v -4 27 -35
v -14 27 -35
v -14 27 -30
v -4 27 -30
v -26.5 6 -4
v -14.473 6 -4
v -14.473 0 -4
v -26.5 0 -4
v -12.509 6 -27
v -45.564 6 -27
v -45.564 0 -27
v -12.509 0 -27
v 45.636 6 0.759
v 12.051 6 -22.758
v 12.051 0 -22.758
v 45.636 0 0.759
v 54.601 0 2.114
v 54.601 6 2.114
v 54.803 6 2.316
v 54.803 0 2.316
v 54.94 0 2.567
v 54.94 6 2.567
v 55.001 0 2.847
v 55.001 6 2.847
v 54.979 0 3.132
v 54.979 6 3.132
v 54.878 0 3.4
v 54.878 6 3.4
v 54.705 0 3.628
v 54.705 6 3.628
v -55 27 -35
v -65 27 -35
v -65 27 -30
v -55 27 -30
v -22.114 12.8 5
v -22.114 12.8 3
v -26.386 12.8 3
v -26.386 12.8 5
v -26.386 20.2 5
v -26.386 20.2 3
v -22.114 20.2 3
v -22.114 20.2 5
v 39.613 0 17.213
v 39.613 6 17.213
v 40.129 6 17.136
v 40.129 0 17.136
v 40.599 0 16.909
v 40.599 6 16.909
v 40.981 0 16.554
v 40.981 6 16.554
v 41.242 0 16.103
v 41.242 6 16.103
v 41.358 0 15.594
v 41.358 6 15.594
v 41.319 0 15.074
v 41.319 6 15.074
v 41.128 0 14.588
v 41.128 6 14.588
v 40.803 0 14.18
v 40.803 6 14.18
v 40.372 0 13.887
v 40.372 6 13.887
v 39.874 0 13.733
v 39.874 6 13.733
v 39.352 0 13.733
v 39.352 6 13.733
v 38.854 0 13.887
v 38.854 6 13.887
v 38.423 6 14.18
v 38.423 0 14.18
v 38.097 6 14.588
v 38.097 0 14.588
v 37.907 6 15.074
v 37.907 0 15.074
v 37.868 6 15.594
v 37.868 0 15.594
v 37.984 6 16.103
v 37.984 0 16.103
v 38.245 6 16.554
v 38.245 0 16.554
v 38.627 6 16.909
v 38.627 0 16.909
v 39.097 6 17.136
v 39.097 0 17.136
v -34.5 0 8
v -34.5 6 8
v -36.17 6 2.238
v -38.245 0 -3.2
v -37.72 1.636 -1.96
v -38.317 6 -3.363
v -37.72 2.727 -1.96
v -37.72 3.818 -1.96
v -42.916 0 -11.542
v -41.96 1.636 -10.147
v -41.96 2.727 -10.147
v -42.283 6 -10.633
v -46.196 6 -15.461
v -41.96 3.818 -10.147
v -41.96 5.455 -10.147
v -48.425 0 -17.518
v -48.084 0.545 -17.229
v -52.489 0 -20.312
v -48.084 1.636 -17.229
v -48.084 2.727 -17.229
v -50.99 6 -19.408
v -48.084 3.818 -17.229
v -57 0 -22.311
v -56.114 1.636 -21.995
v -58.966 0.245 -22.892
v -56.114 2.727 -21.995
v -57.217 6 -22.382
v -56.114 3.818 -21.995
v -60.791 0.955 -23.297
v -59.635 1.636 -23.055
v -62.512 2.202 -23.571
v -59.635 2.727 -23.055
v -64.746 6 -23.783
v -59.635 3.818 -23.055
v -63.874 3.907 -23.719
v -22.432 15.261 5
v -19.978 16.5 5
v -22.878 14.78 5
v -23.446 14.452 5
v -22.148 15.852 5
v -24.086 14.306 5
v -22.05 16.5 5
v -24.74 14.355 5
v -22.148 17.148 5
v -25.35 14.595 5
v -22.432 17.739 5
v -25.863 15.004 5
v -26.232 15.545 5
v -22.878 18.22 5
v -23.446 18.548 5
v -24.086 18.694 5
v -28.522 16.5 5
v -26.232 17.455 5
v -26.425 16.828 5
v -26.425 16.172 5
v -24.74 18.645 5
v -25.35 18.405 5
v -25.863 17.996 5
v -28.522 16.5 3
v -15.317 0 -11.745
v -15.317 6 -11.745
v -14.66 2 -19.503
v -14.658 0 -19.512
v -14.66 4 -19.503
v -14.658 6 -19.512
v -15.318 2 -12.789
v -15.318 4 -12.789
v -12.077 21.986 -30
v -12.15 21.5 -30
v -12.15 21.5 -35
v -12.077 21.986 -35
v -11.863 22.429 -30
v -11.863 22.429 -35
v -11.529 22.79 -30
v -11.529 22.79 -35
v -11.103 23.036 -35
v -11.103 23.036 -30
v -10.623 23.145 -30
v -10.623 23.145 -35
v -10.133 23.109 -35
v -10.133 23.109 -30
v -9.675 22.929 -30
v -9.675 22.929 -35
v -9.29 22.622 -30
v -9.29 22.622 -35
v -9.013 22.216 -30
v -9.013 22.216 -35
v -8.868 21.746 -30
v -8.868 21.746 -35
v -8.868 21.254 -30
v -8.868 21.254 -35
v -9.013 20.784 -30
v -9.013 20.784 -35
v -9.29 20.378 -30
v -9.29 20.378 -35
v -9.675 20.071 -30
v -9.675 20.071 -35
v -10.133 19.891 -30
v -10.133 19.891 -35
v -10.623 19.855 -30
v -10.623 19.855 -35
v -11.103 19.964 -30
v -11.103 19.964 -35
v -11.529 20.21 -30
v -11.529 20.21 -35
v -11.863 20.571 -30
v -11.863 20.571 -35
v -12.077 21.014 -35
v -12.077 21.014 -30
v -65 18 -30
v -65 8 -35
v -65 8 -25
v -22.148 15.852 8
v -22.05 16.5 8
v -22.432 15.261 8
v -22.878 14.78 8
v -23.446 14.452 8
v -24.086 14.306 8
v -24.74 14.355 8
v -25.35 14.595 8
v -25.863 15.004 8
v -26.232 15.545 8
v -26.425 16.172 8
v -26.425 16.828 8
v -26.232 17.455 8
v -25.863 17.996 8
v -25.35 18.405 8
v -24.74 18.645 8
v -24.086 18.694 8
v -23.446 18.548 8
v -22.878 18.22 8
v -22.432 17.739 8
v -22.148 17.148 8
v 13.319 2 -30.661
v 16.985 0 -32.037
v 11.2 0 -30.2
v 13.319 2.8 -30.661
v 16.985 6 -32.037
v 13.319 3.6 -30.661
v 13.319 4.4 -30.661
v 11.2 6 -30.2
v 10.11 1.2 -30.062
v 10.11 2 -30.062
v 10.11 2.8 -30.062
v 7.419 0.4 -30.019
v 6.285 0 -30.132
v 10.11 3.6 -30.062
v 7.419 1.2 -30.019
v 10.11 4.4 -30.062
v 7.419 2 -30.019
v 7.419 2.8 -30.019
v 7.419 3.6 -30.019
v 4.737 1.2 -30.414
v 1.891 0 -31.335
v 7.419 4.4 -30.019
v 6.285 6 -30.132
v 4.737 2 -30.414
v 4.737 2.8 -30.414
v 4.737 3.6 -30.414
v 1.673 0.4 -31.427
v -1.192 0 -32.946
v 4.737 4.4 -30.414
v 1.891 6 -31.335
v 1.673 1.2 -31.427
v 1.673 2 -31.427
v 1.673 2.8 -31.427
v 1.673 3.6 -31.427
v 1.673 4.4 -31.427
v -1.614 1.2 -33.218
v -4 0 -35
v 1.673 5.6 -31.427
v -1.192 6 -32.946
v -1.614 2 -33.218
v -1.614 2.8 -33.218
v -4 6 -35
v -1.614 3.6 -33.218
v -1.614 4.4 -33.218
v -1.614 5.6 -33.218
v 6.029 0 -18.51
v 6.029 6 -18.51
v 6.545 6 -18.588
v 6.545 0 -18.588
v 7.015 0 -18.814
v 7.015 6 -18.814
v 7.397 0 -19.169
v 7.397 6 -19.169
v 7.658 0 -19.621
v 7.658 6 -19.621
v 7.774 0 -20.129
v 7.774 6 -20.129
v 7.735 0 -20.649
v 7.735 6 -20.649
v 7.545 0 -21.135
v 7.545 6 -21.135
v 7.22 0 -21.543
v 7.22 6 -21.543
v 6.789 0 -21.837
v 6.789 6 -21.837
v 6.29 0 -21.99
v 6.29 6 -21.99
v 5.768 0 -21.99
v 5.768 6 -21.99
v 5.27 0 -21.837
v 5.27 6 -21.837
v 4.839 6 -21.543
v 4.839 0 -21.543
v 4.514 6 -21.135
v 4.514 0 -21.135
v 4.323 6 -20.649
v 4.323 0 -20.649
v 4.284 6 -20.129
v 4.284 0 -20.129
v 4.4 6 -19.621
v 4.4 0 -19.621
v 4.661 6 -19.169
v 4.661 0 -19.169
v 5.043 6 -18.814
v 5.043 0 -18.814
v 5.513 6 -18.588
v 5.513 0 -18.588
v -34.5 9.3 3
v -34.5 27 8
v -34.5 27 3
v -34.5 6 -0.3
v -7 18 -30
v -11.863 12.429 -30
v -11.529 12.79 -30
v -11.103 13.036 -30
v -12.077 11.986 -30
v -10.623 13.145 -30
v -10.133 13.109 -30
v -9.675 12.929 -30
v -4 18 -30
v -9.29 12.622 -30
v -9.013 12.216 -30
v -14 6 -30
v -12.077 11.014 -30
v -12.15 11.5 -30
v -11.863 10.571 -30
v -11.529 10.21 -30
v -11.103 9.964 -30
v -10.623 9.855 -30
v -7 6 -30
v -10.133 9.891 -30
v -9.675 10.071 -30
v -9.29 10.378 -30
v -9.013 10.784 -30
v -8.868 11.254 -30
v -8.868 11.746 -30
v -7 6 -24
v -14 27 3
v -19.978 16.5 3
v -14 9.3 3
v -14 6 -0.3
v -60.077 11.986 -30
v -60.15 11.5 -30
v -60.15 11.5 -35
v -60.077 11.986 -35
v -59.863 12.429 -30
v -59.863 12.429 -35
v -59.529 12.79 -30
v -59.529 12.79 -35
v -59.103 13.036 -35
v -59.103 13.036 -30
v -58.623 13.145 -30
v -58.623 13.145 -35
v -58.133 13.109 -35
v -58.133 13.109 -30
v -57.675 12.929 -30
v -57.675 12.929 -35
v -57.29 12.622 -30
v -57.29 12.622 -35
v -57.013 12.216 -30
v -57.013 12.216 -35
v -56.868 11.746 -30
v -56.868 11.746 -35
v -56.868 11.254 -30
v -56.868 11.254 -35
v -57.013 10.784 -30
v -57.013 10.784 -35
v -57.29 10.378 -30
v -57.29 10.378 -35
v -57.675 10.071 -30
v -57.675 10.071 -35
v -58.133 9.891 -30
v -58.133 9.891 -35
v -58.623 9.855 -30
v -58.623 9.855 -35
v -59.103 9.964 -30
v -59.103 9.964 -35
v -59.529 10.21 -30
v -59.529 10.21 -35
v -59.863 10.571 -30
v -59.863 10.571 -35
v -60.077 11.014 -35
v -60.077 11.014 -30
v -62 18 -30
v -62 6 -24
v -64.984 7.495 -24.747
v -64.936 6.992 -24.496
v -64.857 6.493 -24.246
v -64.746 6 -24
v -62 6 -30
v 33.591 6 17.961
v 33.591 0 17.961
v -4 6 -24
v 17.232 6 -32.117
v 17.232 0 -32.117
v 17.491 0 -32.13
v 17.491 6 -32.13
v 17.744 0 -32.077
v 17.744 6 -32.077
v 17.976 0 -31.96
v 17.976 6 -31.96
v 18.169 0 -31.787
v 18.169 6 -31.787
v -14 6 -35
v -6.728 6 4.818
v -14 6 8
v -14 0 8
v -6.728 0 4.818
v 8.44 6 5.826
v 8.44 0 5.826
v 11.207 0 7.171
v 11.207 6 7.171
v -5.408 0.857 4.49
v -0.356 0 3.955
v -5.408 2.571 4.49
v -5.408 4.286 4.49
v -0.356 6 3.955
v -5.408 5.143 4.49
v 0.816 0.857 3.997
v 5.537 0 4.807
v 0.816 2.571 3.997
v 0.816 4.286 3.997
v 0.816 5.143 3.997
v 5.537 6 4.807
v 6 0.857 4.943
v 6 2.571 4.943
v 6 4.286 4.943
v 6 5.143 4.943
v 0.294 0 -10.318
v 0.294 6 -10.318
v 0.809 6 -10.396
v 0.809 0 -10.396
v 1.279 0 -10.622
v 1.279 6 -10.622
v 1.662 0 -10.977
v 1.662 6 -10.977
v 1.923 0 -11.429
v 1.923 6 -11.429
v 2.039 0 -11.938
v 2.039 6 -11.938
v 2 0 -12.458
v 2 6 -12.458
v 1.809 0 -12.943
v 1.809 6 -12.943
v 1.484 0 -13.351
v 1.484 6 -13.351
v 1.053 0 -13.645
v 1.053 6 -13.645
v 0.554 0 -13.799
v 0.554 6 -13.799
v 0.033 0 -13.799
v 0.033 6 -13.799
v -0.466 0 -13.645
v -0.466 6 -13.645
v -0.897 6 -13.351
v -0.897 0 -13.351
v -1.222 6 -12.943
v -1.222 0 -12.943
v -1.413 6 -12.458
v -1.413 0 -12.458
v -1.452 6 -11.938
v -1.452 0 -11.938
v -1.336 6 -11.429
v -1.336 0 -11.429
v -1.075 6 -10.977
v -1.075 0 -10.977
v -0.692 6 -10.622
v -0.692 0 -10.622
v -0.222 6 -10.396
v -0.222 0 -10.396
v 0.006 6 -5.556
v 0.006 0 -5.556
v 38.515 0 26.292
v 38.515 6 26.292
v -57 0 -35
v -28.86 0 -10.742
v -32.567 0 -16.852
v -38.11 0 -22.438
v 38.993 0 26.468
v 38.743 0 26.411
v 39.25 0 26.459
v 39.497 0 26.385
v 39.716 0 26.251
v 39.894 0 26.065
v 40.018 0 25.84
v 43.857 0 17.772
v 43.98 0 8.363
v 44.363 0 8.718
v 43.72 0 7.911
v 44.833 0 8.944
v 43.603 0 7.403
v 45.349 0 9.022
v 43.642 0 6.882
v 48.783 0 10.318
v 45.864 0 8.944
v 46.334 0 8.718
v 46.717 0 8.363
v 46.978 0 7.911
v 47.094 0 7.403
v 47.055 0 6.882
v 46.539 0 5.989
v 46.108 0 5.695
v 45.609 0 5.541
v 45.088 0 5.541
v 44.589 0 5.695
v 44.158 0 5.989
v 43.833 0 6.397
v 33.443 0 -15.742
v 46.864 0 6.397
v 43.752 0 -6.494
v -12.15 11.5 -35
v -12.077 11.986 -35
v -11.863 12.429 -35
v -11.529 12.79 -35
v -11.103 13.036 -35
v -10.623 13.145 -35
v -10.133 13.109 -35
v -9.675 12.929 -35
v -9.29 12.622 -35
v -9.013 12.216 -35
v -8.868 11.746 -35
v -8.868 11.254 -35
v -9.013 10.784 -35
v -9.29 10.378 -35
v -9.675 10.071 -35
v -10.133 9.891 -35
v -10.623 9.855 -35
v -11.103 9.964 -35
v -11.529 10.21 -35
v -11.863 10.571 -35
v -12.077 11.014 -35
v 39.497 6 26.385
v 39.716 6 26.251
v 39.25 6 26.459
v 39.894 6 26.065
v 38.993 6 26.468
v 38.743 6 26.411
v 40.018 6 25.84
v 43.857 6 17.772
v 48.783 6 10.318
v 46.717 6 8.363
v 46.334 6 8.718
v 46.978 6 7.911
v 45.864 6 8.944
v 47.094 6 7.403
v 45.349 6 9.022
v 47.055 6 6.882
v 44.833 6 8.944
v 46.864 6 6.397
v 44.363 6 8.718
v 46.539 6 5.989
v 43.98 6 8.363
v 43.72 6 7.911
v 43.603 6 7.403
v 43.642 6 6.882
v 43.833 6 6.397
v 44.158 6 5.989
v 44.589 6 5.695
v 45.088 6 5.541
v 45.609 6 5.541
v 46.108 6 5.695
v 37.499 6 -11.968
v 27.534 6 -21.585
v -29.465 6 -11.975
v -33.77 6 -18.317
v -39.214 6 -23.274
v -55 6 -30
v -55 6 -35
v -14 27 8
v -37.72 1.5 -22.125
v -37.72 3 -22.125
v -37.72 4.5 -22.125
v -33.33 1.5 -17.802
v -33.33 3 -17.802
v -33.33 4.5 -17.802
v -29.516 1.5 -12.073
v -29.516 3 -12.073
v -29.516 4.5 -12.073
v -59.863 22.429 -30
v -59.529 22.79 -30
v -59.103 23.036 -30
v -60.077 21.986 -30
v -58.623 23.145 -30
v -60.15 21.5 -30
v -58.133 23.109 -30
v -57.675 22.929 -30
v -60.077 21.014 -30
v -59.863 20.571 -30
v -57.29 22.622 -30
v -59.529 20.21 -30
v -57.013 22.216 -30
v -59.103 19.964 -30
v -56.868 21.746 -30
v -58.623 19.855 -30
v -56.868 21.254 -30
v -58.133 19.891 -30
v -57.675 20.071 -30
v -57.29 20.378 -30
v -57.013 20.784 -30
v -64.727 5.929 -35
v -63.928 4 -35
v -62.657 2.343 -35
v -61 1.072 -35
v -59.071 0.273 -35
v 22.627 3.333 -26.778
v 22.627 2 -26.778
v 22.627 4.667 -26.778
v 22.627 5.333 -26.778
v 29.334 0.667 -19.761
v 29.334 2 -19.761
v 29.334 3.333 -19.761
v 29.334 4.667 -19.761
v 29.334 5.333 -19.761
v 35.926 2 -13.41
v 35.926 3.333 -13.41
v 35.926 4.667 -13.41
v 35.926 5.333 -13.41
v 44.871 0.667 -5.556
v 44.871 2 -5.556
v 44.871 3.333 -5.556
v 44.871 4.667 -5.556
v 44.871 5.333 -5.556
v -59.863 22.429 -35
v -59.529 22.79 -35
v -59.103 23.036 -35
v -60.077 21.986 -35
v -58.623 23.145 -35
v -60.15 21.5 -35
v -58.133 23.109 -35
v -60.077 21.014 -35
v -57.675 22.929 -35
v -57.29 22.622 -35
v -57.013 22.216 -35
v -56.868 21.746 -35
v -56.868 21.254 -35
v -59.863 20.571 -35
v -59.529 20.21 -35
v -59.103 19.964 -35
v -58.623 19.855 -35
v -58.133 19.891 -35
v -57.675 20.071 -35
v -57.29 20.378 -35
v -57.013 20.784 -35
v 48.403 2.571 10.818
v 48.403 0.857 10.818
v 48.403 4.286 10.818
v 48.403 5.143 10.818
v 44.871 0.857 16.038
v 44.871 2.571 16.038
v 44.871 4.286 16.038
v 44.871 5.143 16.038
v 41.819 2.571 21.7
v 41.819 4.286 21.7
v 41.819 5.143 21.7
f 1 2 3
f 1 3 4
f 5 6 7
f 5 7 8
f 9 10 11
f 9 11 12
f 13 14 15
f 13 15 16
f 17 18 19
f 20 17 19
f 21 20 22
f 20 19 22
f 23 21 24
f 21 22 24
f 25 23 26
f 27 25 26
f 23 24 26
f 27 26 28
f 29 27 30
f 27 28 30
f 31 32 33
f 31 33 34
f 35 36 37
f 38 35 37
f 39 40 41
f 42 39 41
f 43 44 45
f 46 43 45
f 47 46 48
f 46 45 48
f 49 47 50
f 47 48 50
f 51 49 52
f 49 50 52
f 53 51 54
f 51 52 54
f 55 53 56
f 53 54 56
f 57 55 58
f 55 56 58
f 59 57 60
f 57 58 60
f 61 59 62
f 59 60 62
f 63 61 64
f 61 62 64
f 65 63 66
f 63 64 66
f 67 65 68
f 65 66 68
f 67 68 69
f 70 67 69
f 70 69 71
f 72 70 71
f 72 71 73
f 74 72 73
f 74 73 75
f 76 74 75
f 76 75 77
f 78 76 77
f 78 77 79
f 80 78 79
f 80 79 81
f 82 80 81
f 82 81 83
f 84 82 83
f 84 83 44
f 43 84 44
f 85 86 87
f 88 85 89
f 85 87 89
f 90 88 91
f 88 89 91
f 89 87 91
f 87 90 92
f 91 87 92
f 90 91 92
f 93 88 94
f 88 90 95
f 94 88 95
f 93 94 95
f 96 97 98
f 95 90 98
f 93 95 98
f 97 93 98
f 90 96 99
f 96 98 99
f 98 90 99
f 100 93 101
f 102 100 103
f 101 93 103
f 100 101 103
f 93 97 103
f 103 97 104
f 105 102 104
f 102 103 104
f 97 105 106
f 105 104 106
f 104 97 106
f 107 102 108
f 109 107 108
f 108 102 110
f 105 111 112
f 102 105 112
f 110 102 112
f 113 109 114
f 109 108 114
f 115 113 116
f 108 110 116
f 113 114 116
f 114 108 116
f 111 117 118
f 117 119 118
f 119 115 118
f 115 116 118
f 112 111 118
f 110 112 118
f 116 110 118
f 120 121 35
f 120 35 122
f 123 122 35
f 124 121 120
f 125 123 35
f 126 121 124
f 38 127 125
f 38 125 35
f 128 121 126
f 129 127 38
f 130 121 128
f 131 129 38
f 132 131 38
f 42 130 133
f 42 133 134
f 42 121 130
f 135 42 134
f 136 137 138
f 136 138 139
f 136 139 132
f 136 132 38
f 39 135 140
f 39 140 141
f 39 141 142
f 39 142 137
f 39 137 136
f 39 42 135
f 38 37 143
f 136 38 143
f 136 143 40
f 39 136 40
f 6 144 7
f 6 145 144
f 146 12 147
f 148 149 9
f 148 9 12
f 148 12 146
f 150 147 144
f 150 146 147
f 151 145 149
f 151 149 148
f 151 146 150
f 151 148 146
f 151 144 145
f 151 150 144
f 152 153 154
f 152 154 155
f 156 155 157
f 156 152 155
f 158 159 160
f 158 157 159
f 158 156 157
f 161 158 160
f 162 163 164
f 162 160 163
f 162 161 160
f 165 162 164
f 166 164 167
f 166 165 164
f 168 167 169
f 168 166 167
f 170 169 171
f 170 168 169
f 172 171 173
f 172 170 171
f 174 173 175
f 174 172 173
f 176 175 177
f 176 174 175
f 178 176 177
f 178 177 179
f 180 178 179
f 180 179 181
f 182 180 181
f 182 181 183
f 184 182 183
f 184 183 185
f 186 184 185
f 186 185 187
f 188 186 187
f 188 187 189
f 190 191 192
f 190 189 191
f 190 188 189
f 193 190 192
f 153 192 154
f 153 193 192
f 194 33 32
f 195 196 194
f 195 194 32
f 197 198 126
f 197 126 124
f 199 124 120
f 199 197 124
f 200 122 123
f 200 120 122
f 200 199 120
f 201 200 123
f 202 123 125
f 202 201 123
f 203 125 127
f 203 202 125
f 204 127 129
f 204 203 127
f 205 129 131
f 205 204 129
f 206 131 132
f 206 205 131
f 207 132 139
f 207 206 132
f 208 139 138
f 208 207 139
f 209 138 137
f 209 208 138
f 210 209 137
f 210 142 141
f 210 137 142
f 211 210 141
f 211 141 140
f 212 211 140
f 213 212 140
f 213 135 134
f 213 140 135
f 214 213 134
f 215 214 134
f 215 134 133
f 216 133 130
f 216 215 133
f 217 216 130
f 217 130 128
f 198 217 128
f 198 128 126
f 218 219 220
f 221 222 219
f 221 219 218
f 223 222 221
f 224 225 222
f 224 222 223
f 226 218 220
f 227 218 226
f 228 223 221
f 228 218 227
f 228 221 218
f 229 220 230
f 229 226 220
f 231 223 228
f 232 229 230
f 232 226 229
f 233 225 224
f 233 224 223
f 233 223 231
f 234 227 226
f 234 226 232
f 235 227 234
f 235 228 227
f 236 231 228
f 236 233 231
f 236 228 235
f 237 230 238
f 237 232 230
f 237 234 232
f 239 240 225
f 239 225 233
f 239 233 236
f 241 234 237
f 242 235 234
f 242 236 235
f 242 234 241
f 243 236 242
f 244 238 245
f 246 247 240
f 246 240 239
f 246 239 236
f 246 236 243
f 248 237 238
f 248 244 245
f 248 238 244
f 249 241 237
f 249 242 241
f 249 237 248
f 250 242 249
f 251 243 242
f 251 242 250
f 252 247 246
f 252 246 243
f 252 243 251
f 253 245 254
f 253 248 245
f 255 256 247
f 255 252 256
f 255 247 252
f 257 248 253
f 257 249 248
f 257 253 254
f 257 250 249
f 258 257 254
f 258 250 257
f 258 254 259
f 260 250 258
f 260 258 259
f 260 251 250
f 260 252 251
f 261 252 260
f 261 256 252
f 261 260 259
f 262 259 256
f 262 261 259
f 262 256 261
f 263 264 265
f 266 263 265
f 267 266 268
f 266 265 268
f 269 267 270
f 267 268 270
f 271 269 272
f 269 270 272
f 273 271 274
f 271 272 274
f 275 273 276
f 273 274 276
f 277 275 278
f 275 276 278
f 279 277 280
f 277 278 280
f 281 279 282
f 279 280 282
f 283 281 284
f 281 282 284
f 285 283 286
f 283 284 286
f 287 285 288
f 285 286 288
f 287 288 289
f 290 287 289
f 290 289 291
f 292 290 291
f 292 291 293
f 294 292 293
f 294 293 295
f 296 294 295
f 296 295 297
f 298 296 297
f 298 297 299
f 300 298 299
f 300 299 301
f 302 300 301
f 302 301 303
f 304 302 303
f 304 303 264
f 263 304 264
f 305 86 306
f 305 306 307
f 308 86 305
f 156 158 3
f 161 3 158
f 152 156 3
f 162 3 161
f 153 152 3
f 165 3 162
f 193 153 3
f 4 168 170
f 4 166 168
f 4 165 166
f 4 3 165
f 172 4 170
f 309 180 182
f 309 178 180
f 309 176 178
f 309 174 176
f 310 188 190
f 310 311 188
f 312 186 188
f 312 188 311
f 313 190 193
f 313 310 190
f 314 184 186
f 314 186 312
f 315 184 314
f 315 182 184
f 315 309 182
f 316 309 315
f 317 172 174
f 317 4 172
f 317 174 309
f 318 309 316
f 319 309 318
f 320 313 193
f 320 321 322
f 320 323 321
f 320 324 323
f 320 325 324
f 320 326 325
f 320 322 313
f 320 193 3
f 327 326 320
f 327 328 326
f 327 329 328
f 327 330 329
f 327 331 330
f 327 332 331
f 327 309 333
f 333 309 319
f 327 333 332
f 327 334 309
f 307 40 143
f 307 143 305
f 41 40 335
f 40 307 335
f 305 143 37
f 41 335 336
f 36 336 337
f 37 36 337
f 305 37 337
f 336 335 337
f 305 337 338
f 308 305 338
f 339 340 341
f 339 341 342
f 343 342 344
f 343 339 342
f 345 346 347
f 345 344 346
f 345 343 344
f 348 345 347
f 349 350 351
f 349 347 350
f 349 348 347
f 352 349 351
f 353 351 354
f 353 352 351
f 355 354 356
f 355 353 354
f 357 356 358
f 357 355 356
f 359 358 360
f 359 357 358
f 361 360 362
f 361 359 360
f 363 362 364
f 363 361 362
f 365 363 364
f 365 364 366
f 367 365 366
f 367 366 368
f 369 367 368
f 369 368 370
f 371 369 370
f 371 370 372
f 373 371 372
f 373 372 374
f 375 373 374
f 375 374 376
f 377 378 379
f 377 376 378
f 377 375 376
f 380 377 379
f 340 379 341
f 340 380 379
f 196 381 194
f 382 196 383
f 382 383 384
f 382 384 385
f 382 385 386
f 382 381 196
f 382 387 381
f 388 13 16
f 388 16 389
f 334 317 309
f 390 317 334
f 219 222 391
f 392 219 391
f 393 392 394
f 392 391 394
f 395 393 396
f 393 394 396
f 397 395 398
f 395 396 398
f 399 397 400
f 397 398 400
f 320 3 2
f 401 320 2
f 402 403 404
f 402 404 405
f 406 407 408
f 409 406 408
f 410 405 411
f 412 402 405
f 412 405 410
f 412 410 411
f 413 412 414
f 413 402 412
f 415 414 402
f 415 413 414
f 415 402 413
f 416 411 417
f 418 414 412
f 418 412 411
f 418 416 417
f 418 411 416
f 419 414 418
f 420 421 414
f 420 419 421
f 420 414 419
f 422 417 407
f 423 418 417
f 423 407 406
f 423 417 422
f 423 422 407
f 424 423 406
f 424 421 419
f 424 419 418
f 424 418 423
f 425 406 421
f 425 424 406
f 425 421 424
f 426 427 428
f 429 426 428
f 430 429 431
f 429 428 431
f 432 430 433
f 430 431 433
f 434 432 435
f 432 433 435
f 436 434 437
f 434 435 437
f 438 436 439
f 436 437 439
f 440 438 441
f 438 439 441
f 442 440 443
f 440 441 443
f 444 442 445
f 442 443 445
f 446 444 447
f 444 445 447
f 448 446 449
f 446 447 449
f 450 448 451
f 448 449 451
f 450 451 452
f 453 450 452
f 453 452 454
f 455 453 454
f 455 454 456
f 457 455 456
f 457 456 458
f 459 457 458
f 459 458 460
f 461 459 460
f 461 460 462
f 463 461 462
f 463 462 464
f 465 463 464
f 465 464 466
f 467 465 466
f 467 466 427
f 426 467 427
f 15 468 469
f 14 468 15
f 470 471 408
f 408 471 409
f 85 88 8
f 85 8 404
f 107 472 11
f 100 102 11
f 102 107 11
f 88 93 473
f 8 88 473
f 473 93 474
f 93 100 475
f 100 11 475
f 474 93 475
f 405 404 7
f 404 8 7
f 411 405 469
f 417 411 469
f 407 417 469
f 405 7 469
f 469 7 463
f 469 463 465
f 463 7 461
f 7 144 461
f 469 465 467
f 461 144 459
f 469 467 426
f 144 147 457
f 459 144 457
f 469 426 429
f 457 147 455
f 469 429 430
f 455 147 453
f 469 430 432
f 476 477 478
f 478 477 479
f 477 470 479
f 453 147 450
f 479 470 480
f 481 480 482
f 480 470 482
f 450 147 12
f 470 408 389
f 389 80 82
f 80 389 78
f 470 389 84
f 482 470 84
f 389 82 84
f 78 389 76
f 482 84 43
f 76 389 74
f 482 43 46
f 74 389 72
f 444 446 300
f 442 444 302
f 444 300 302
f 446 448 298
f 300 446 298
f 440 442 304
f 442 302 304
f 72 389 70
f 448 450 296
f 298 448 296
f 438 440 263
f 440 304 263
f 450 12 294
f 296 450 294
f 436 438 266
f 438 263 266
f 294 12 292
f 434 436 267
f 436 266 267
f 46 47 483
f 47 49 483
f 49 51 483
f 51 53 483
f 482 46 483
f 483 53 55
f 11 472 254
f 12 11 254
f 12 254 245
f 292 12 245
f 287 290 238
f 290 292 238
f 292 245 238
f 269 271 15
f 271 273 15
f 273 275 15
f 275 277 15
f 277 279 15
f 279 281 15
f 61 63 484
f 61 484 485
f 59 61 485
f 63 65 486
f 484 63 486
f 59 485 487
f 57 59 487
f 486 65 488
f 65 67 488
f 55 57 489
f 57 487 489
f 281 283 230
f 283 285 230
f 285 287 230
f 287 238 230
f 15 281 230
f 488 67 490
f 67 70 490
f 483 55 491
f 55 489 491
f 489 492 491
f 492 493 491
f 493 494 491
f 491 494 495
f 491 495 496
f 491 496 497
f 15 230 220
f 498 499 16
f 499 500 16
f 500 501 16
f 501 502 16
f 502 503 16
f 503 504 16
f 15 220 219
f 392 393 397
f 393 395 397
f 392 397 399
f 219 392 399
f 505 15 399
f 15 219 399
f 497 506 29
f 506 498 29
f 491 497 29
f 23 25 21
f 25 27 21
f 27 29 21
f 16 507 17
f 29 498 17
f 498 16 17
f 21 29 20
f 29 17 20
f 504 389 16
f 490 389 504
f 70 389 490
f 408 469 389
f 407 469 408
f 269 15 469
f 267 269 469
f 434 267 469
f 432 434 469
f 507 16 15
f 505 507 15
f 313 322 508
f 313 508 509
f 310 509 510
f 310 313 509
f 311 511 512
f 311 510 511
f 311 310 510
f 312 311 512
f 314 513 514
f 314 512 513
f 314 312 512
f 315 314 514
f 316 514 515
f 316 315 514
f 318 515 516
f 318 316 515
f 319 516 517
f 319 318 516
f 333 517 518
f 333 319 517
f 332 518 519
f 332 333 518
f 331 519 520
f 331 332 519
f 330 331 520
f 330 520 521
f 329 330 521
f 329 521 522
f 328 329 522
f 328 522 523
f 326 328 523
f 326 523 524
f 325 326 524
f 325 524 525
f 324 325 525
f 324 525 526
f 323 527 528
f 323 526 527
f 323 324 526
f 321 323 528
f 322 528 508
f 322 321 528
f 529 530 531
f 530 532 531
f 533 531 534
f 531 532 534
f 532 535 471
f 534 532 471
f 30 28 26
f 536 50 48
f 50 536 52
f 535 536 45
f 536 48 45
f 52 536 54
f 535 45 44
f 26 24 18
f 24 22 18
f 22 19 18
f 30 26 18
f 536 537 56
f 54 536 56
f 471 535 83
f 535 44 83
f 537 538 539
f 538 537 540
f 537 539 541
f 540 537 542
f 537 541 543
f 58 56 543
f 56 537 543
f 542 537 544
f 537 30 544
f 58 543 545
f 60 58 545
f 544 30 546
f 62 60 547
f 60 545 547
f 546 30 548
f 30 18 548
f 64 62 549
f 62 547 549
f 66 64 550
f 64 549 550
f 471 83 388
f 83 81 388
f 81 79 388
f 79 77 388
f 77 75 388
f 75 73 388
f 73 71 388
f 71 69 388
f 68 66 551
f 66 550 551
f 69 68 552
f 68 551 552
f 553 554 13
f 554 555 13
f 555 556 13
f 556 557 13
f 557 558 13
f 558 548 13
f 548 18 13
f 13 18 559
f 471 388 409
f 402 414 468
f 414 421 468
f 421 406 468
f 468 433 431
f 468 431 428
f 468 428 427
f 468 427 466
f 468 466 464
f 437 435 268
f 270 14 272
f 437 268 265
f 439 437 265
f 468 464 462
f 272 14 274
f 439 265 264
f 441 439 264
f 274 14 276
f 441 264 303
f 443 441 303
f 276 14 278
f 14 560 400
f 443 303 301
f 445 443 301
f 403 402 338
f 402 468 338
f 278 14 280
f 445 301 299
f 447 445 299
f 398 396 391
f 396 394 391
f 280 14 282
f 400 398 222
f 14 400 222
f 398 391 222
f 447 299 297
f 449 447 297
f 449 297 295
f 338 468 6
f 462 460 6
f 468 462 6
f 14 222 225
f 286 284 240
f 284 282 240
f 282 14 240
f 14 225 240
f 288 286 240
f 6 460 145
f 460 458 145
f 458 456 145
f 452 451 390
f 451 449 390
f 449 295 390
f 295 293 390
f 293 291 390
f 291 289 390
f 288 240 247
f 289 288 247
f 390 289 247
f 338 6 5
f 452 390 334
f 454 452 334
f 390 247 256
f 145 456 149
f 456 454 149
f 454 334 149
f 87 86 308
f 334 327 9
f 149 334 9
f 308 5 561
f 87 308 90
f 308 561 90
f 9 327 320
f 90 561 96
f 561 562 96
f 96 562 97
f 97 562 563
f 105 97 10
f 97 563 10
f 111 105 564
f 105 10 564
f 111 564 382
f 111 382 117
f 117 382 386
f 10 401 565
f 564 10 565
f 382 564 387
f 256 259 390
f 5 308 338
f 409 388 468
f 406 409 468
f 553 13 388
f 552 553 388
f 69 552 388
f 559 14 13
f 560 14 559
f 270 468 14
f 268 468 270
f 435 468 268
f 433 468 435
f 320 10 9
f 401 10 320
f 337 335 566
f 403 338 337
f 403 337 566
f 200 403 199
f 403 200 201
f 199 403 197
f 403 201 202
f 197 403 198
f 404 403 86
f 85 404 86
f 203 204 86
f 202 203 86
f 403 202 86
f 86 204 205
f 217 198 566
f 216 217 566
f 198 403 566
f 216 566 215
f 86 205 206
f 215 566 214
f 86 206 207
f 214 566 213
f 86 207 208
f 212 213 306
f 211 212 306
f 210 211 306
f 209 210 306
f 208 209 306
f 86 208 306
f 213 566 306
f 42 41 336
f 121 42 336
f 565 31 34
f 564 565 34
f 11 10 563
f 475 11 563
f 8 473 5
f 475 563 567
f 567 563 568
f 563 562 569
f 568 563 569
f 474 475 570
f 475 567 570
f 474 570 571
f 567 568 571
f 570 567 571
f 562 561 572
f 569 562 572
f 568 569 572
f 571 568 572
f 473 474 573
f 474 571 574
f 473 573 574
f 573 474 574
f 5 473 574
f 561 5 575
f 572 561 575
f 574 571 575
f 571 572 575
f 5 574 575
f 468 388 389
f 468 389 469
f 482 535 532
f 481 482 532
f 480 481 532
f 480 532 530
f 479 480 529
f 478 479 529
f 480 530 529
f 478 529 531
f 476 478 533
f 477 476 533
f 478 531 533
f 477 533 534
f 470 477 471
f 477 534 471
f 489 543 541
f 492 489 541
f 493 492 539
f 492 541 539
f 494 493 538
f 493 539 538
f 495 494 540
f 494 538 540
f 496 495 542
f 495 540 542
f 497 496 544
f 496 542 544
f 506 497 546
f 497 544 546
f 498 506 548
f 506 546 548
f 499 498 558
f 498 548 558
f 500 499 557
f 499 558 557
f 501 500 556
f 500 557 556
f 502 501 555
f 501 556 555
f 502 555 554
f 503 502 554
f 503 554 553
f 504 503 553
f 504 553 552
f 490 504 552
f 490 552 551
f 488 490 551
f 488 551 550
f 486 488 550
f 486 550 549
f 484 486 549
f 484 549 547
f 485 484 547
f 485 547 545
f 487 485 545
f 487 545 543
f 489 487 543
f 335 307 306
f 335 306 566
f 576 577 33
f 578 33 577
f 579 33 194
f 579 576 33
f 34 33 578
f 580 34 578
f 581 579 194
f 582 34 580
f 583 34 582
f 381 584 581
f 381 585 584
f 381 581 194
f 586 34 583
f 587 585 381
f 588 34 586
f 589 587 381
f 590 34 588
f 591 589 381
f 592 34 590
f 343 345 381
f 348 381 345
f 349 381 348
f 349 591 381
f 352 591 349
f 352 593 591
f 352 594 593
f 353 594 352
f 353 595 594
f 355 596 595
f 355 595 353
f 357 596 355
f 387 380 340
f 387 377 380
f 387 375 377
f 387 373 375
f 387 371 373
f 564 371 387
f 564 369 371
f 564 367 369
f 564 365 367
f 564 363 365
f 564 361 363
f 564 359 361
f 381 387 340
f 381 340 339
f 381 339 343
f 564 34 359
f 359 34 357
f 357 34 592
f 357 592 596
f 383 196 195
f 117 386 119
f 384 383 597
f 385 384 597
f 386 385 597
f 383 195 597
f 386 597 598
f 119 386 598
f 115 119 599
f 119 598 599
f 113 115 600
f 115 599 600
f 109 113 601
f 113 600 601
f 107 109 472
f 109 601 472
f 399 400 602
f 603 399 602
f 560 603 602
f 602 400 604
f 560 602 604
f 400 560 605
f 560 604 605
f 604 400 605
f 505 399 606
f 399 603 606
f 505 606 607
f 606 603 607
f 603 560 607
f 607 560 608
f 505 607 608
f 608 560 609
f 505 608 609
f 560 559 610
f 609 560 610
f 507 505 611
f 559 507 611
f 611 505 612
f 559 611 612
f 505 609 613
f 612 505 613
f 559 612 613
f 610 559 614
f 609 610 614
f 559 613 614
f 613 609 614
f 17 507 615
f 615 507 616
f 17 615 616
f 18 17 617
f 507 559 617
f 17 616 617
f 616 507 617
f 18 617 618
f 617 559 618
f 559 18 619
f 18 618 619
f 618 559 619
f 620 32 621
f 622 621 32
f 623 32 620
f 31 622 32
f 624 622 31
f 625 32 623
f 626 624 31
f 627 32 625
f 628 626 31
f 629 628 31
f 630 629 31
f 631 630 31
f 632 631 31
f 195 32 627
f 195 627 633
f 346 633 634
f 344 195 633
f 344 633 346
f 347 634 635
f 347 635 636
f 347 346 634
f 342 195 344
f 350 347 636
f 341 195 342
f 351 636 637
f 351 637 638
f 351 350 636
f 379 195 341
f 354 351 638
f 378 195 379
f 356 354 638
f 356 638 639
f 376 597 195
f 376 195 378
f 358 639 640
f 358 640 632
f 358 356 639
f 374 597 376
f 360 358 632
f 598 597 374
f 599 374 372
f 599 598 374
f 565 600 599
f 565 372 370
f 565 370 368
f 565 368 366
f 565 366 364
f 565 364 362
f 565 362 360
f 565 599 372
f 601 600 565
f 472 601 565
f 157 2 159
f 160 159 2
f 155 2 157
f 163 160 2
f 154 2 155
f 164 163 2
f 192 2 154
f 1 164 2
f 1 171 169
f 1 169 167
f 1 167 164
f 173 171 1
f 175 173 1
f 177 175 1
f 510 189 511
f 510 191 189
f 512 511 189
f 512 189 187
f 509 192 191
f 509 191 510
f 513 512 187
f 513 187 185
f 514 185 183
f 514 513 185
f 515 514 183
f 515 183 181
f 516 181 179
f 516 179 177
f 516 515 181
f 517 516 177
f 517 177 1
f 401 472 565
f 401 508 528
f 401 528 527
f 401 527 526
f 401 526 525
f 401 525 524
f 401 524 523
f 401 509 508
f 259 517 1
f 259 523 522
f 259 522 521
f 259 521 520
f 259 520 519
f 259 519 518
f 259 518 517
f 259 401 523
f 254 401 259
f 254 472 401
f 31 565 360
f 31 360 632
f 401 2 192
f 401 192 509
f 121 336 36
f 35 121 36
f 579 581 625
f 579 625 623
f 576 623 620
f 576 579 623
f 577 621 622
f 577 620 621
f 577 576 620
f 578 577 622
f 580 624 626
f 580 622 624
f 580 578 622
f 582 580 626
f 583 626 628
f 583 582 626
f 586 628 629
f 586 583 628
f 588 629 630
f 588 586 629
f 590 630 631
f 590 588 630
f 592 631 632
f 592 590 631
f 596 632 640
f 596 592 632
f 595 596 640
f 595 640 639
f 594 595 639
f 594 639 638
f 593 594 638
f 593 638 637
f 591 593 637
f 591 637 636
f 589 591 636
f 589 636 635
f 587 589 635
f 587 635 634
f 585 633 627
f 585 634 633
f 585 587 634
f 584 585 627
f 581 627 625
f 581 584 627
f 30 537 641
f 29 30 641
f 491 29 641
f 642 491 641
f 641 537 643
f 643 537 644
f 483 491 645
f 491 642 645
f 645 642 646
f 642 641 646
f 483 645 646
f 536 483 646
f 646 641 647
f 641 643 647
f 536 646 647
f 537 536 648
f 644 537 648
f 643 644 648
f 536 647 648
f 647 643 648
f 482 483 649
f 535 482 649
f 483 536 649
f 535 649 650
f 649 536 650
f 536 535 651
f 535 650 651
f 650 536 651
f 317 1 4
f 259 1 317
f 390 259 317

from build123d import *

# Parameters (mm, degrees)
SKETCH1_W               = 130
SKETCH1_H               = 70
BOSS_EXTRUDE1_DEPTH     = 27
SKETCH2_R               = 1.75
CUT_EXTRUDE1_DEPTH      = 27
CUT_EXTRUDE2_START      = -21
CUT_EXTRUDE2_OUTLINE_R  = 1.75
CUT_EXTRUDE2_DEPTH      = 21
CUT_EXTRUDE3_DEPTH      = 100.823879977
CUT_EXTRUDE3_DEPTH_BACK = 100.823879977
CUT_EXTRUDE4_DEPTH      = 80.987499152
CUT_EXTRUDE4_DEPTH_BACK = 80.987499152
SKETCH5_R               = 1.65
SKETCH5_R_2             = 2.2
CUT_EXTRUDE5_DEPTH      = 2
FILLET2_R               = 8


# Read off the part's stored shape, not the designer's step: Cut-Extrude2
with BuildPart() as part:
    # Sketch1 → Boss-Extrude1 (new body)
    with BuildSketch(Plane(origin=(0, 0, 0), x_dir=(1, 0, 0), z_dir=(0, 1, 0))):
        Rectangle(SKETCH1_W, SKETCH1_H)
    extrude(amount=BOSS_EXTRUDE1_DEPTH)

    # Sketch2 → Cut-Extrude1 (cut)
    with BuildSketch(Plane(origin=(0, 27, 0), x_dir=(1, 0, 0), z_dir=(0, 1, 0))):
        with BuildLine():
            Line((65, 35), (-4, 35))
            add(Edge.make_bspline(
                [(16.985276193, 32.037400285), (16.344384253, 31.734586923), (15.139997676, 31.224413868), (13.363177927, 30.647367552), (11.717672063, 30.264833972), (10.188111987, 30.048519757), (8.761038737, 29.968698707), (7.386612758, 30.001896041), (6.043994999, 30.146954639), (4.647593927, 30.414660082), (3.19578664, 30.821123925), (1.740907748, 31.375111265), (0.506749671, 31.963769434), (-0.587741435, 32.566280044), (-1.628944852, 33.212844151), (-2.805878859, 34.038462463), (-3.58582038, 34.654179882), (-4, 35)],
                knots=[0, 0, 0, 0, 0.094281903, 0.173839808, 0.248204838, 0.318741989, 0.379062302, 0.438143998, 0.501439531, 0.558475445, 0.627109695, 0.701723198, 0.765277059, 0.808848652, 0.867872888, 0.928222089, 1, 1, 1, 1], degree=3))
            ThreePointArc((16.985276193, 32.037400285), (17.619352011, 32.111625453), (18.169122212, 31.787103892))
            add(Edge.make_bspline(
                [(18.169122212, 31.787103892), (18.880572219, 30.963826417), (20.353964659, 29.282877442), (22.960721292, 26.394523325), (25.956424204, 23.194668161), (29.413337423, 19.655492092), (32.721030959, 16.412362495), (36.121712054, 13.209386341), (40.056563488, 9.645356576), (46.199565364, 4.366442592), (51.289830213, 0.354927225), (54.600855171, -2.113733504)],
                knots=[0, 0, 0, 0, 0.065465906, 0.134483043, 0.234080041, 0.329168047, 0.432121818, 0.51276386, 0.610223282, 0.751517468, 1, 1, 1, 1], degree=3))
            ThreePointArc((54.600855171, -2.113733504), (55.000762083, -2.84691143), (54.704832326, -3.627873009))
            add(Edge.make_bspline(
                [(54.704832326, -3.627873009), (53.498966947, -4.81552915), (51.311897548, -7.140167952), (48.69963123, -10.367424816), (46.601925875, -13.292582874), (44.80812232, -16.078484523), (43.184554029, -18.939393608), (41.54418466, -22.201248931), (40.571491097, -24.44033411), (40.018197727, -25.840134095)],
                knots=[0, 0, 0, 0, 0.189281305, 0.356736472, 0.463941083, 0.591760781, 0.727143489, 0.83164987, 1, 1, 1, 1], degree=3))
            ThreePointArc((40.018197727, -25.840134095), (39.375842934, -26.43026519), (38.514642112, -26.291673943))
            Line((38.514642112, -26.291673943), (11.207024421, -7.170674209))
            add(Edge.make_bspline(
                [(-14, -8), (-12.271757293, -6.971672517), (-9.466063488, -5.598856445), (-5.386625364, -4.405667761), (-2.228024111, -3.944265665), (0.835893041, -3.933946272), (3.534272193, -4.284331997), (7.080143183, -5.174272804), (9.554008371, -6.255827229), (11.207024421, -7.170674209)],
                knots=[0, 0, 0, 0, 0.227553532, 0.351236087, 0.479384283, 0.587200541, 0.696804288, 0.786205014, 1, 1, 1, 1], degree=3))
            Line((-14, -8), (-34.5, -8))
            add(Edge.make_bspline(
                [(-34.5, -8), (-34.998716381, -6.018305789), (-35.964034069, -2.659544028), (-37.427398174, 1.315845087), (-38.863544091, 4.641999873), (-40.252890439, 7.393277622), (-42.354272337, 10.856052977), (-44.782138282, 14.09338159), (-47.910103128, 17.205621078), (-51.557866637, 19.931151613), (-55.480439434, 21.894814973), (-60.176202103, 23.297139891), (-63.196027982, 23.703049389), (-65, 23.797699279)],
                knots=[0, 0, 0, 0, 0.128897983, 0.220226627, 0.266962342, 0.357379422, 0.414326697, 0.522335212, 0.611659128, 0.691709781, 0.808709753, 0.886032473, 1, 1, 1, 1], degree=3))
            Line((-65, 23.797699279), (-65, -35))
            Line((-65, -35), (65, -35))
            Line((65, -35), (65, 35))
        make_face()
        Polygon((33.591106657, -17.961078948), (0.005872841, 5.555554943), (12.050978004, 22.757747873), (45.63621182, -0.758886018), align=None)
        with BuildLine():
            add(Edge.make_bspline(
                [(-12.50850871, 27), (-13.456798873, 24.573487755), (-14.814722597, 19.89522318), (-15.579858129, 12.089800552), (-15.057965095, 6.888745359), (-14.472989206, 4)],
                knots=[0, 0, 0, 0, 0.333751147, 0.622103639, 1, 1, 1, 1], degree=3))
            Line((-14.472989206, 4), (-26.5, 4))
            add(Edge.make_bspline(
                [(-45.563538233, 27), (-42.772339428, 25.689399679), (-38.343403879, 22.999001318), (-33.000298141, 17.764831394), (-28.975299715, 11.692876511), (-27.193040414, 6.790024988), (-26.5, 4)],
                knots=[0, 0, 0, 0, 0.299156058, 0.498403991, 0.72092627, 1, 1, 1, 1], degree=3))
            Line((-45.563538233, 27), (-12.50850871, 27))
        make_face()
        with Locations(Location((0.293511086, 12.068408714, 0), (0, 0, 270))):
            Circle(SKETCH2_R)
        with Locations(Location((6.029275449, 20.259929156, 0), (0, 0, 270))):
            Circle(SKETCH2_R)
        with Locations(Location((45.348573575, -7.271739788, 0), (0, 0, 270))):
            Circle(SKETCH2_R)
        with Locations(Location((39.612809212, -15.463260231, 0), (0, 0, 270))):
            Circle(SKETCH2_R)
    extrude(amount=-CUT_EXTRUDE1_DEPTH, mode=Mode.SUBTRACT)

    # Cut-Extrude2 outline → Cut-Extrude2 (cut)
    with BuildSketch(Plane(origin=(0, 27, 0), x_dir=(1, 0, 0), z_dir=(0, 1, 0)).offset(CUT_EXTRUDE2_START)):
        with BuildLine():
            add(Edge.make_bspline(
                [(-34.5, -8), (-34.998716381, -6.018305789), (-35.964034069, -2.659544028), (-37.427398174, 1.315845087), (-38.863544091, 4.641999873), (-40.252890439, 7.393277622), (-42.354272337, 10.856052977), (-44.782138282, 14.09338159), (-47.910103128, 17.205621078), (-51.557866637, 19.931151613), (-55.480439434, 21.894814973), (-60.176202103, 23.297139891), (-63.196027982, 23.703049389), (-65, 23.797699279)],
                knots=[0, 0, 0, 0, 0.128897983, 0.220226627, 0.266962342, 0.357379422, 0.414326697, 0.522335212, 0.611659128, 0.691709781, 0.808709753, 0.886032473, 1, 1, 1, 1], degree=3))
            Line((-34.5, -8), (-34.5, 0.3))
            Line((-34.5, 0.3), (-14, 0.3))
            Line((-14, 0.3), (-14, -8))
            add(Edge.make_bspline(
                [(-14, -8), (-12.271757293, -6.971672517), (-9.466063488, -5.598856445), (-5.386625364, -4.405667761), (-2.228024111, -3.944265665), (0.835893041, -3.933946272), (3.534272193, -4.284331997), (7.080143183, -5.174272804), (9.554008371, -6.255827229), (11.207024421, -7.170674209)],
                knots=[0, 0, 0, 0, 0.227553532, 0.351236087, 0.479384283, 0.587200541, 0.696804288, 0.786205014, 1, 1, 1, 1], degree=3))
            Line((11.207024421, -7.170674209), (38.514642112, -26.291673943))
            ThreePointArc((38.514642112, -26.291673943), (39.375842934, -26.43026519), (40.018197727, -25.840134095))
            add(Edge.make_bspline(
                [(54.704832326, -3.627873009), (53.498966947, -4.81552915), (51.311897548, -7.140167952), (48.69963123, -10.367424816), (46.601925875, -13.292582874), (44.80812232, -16.078484523), (43.184554029, -18.939393608), (41.54418466, -22.201248931), (40.571491097, -24.44033411), (40.018197727, -25.840134095)],
                knots=[0, 0, 0, 0, 0.189281305, 0.356736472, 0.463941083, 0.591760781, 0.727143489, 0.83164987, 1, 1, 1, 1], degree=3))
            ThreePointArc((54.704832326, -3.627873009), (55.000762083, -2.84691143), (54.600855171, -2.113733504))
            add(Edge.make_bspline(
                [(18.169122212, 31.787103892), (18.880572219, 30.963826417), (20.353964659, 29.282877442), (22.960721292, 26.394523325), (25.956424204, 23.194668161), (29.413337423, 19.655492092), (32.721030959, 16.412362495), (36.121712054, 13.209386341), (40.056563488, 9.645356576), (46.199565364, 4.366442592), (51.289830213, 0.354927225), (54.600855171, -2.113733504)],
                knots=[0, 0, 0, 0, 0.065465906, 0.134483043, 0.234080041, 0.329168047, 0.432121818, 0.51276386, 0.610223282, 0.751517468, 1, 1, 1, 1], degree=3))
            ThreePointArc((18.169122212, 31.787103892), (17.619352011, 32.111625453), (16.985276193, 32.037400285))
            add(Edge.make_bspline(
                [(16.985276193, 32.037400285), (16.344384253, 31.734586923), (15.139997676, 31.224413868), (13.363177927, 30.647367552), (11.717672063, 30.264833972), (10.188111987, 30.048519757), (8.761038737, 29.968698707), (7.386612758, 30.001896041), (6.043994999, 30.146954639), (4.647593927, 30.414660082), (3.19578664, 30.821123925), (1.740907748, 31.375111265), (0.506749671, 31.963769434), (-0.587741435, 32.566280044), (-1.628944852, 33.212844151), (-2.805878859, 34.038462463), (-3.58582038, 34.654179882), (-4, 35)],
                knots=[0, 0, 0, 0, 0.094281903, 0.173839808, 0.248204838, 0.318741989, 0.379062302, 0.438143998, 0.501439531, 0.558475445, 0.627109695, 0.701723198, 0.765277059, 0.808848652, 0.867872888, 0.928222089, 1, 1, 1, 1], degree=3))
            Line((-4, 35), (-4, 24))
            Line((-4, 24), (-7, 24))
            Line((-7, 24), (-7, 30))
            Line((-7, 30), (-14, 30))
            Line((-14, 30), (-14, 35))
            Line((-14, 35), (-55, 35))
            Line((-55, 35), (-55, 30))
            Line((-55, 30), (-62, 30))
            Line((-62, 30), (-62, 24))
            Line((-62, 24), (-65, 24))
            Line((-65, 24), (-65, 23.797699279))
        make_face()
        with Locations((39.612809212, -15.463260231)):
            Circle(CUT_EXTRUDE2_OUTLINE_R, mode=Mode.SUBTRACT)
        Polygon((45.63621182, -0.758886018), (33.591106657, -17.961078948), (0.005872841, 5.555554943), (12.050978004, 22.757747873), align=None, mode=Mode.SUBTRACT)
        with Locations((45.348573575, -7.271739788)):
            Circle(CUT_EXTRUDE2_OUTLINE_R, mode=Mode.SUBTRACT)
        with BuildLine():
            Line((-45.563538233, 27), (-12.50850871, 27))
            add(Edge.make_bspline(
                [(-12.50850871, 27), (-13.456798873, 24.573487755), (-14.814722597, 19.89522318), (-15.579858129, 12.089800552), (-15.057965095, 6.888745359), (-14.472989206, 4)],
                knots=[0, 0, 0, 0, 0.333751147, 0.622103639, 1, 1, 1, 1], degree=3))
            Line((-14.472989206, 4), (-26.5, 4))
            add(Edge.make_bspline(
                [(-45.563538233, 27), (-42.772339428, 25.689399679), (-38.343403879, 22.999001318), (-33.000298141, 17.764831394), (-28.975299715, 11.692876511), (-27.193040414, 6.790024988), (-26.5, 4)],
                knots=[0, 0, 0, 0, 0.299156058, 0.498403991, 0.72092627, 1, 1, 1, 1], degree=3))
        make_face(mode=Mode.SUBTRACT)
        with Locations((0.293511086, 12.068408714)):
            Circle(CUT_EXTRUDE2_OUTLINE_R, mode=Mode.SUBTRACT)
        with Locations((6.029275449, 20.259929156)):
            Circle(CUT_EXTRUDE2_OUTLINE_R, mode=Mode.SUBTRACT)
    extrude(amount=CUT_EXTRUDE2_DEPTH, mode=Mode.SUBTRACT)

    # Sketch4 → Cut-Extrude3 (cut, two sides: drawn at the far end of the back side and taken through both)
    with BuildSketch(Plane.ZY.offset(34.5).offset(-CUT_EXTRUDE3_DEPTH_BACK)):
        Polygon((-0.3, 27), (3, 27), (3, 9.3), (-0.3, 6), align=None)
        Polygon((-24, 27), (-30, 27), (-30, 18), (-24, 6), align=None)
    extrude(amount=CUT_EXTRUDE3_DEPTH + CUT_EXTRUDE3_DEPTH_BACK, mode=Mode.SUBTRACT)

    # Sketch5 → Cut-Extrude4 (cut, two sides: drawn at the far end of the back side and taken through both)
    with BuildSketch(Plane(origin=(0, 0, 3), x_dir=(-1, 0, 0), z_dir=(0, 0, -1)).offset(-CUT_EXTRUDE4_DEPTH_BACK)):
        with Locations((10.5, 21.5)):
            Circle(SKETCH5_R)
        with Locations((10.5, 11.5)):
            Circle(SKETCH5_R)
        with Locations((58.5, 21.5)):
            Circle(SKETCH5_R)
        with Locations((58.5, 11.5)):
            Circle(SKETCH5_R)
        with Locations(Location((24.25, 16.5, 0), (0, 0, 180))):
            Circle(SKETCH5_R_2)
    extrude(amount=CUT_EXTRUDE4_DEPTH + CUT_EXTRUDE4_DEPTH_BACK, mode=Mode.SUBTRACT)

    # Sketch6 → Cut-Extrude5 (cut)
    with BuildSketch(Plane(origin=(0, 0, 3), x_dir=(-1, 0, 0), z_dir=(0, 0, -1))):
        Polygon((26.386195996, 20.2), (22.113804004, 20.2), (19.977608008, 16.5), (22.113804004, 12.8), (26.386195996, 12.8), (28.522391992, 16.5), align=None)
    extrude(amount=-CUT_EXTRUDE5_DEPTH, mode=Mode.SUBTRACT)

    # Fillet2
    fillet2_edges = [part.edges().sort_by_distance(p)[0] for p in [
        (-65, 0, -29.398849639),
    ]]
    fillet(fillet2_edges, radius=FILLET2_R)


solid = part.part
